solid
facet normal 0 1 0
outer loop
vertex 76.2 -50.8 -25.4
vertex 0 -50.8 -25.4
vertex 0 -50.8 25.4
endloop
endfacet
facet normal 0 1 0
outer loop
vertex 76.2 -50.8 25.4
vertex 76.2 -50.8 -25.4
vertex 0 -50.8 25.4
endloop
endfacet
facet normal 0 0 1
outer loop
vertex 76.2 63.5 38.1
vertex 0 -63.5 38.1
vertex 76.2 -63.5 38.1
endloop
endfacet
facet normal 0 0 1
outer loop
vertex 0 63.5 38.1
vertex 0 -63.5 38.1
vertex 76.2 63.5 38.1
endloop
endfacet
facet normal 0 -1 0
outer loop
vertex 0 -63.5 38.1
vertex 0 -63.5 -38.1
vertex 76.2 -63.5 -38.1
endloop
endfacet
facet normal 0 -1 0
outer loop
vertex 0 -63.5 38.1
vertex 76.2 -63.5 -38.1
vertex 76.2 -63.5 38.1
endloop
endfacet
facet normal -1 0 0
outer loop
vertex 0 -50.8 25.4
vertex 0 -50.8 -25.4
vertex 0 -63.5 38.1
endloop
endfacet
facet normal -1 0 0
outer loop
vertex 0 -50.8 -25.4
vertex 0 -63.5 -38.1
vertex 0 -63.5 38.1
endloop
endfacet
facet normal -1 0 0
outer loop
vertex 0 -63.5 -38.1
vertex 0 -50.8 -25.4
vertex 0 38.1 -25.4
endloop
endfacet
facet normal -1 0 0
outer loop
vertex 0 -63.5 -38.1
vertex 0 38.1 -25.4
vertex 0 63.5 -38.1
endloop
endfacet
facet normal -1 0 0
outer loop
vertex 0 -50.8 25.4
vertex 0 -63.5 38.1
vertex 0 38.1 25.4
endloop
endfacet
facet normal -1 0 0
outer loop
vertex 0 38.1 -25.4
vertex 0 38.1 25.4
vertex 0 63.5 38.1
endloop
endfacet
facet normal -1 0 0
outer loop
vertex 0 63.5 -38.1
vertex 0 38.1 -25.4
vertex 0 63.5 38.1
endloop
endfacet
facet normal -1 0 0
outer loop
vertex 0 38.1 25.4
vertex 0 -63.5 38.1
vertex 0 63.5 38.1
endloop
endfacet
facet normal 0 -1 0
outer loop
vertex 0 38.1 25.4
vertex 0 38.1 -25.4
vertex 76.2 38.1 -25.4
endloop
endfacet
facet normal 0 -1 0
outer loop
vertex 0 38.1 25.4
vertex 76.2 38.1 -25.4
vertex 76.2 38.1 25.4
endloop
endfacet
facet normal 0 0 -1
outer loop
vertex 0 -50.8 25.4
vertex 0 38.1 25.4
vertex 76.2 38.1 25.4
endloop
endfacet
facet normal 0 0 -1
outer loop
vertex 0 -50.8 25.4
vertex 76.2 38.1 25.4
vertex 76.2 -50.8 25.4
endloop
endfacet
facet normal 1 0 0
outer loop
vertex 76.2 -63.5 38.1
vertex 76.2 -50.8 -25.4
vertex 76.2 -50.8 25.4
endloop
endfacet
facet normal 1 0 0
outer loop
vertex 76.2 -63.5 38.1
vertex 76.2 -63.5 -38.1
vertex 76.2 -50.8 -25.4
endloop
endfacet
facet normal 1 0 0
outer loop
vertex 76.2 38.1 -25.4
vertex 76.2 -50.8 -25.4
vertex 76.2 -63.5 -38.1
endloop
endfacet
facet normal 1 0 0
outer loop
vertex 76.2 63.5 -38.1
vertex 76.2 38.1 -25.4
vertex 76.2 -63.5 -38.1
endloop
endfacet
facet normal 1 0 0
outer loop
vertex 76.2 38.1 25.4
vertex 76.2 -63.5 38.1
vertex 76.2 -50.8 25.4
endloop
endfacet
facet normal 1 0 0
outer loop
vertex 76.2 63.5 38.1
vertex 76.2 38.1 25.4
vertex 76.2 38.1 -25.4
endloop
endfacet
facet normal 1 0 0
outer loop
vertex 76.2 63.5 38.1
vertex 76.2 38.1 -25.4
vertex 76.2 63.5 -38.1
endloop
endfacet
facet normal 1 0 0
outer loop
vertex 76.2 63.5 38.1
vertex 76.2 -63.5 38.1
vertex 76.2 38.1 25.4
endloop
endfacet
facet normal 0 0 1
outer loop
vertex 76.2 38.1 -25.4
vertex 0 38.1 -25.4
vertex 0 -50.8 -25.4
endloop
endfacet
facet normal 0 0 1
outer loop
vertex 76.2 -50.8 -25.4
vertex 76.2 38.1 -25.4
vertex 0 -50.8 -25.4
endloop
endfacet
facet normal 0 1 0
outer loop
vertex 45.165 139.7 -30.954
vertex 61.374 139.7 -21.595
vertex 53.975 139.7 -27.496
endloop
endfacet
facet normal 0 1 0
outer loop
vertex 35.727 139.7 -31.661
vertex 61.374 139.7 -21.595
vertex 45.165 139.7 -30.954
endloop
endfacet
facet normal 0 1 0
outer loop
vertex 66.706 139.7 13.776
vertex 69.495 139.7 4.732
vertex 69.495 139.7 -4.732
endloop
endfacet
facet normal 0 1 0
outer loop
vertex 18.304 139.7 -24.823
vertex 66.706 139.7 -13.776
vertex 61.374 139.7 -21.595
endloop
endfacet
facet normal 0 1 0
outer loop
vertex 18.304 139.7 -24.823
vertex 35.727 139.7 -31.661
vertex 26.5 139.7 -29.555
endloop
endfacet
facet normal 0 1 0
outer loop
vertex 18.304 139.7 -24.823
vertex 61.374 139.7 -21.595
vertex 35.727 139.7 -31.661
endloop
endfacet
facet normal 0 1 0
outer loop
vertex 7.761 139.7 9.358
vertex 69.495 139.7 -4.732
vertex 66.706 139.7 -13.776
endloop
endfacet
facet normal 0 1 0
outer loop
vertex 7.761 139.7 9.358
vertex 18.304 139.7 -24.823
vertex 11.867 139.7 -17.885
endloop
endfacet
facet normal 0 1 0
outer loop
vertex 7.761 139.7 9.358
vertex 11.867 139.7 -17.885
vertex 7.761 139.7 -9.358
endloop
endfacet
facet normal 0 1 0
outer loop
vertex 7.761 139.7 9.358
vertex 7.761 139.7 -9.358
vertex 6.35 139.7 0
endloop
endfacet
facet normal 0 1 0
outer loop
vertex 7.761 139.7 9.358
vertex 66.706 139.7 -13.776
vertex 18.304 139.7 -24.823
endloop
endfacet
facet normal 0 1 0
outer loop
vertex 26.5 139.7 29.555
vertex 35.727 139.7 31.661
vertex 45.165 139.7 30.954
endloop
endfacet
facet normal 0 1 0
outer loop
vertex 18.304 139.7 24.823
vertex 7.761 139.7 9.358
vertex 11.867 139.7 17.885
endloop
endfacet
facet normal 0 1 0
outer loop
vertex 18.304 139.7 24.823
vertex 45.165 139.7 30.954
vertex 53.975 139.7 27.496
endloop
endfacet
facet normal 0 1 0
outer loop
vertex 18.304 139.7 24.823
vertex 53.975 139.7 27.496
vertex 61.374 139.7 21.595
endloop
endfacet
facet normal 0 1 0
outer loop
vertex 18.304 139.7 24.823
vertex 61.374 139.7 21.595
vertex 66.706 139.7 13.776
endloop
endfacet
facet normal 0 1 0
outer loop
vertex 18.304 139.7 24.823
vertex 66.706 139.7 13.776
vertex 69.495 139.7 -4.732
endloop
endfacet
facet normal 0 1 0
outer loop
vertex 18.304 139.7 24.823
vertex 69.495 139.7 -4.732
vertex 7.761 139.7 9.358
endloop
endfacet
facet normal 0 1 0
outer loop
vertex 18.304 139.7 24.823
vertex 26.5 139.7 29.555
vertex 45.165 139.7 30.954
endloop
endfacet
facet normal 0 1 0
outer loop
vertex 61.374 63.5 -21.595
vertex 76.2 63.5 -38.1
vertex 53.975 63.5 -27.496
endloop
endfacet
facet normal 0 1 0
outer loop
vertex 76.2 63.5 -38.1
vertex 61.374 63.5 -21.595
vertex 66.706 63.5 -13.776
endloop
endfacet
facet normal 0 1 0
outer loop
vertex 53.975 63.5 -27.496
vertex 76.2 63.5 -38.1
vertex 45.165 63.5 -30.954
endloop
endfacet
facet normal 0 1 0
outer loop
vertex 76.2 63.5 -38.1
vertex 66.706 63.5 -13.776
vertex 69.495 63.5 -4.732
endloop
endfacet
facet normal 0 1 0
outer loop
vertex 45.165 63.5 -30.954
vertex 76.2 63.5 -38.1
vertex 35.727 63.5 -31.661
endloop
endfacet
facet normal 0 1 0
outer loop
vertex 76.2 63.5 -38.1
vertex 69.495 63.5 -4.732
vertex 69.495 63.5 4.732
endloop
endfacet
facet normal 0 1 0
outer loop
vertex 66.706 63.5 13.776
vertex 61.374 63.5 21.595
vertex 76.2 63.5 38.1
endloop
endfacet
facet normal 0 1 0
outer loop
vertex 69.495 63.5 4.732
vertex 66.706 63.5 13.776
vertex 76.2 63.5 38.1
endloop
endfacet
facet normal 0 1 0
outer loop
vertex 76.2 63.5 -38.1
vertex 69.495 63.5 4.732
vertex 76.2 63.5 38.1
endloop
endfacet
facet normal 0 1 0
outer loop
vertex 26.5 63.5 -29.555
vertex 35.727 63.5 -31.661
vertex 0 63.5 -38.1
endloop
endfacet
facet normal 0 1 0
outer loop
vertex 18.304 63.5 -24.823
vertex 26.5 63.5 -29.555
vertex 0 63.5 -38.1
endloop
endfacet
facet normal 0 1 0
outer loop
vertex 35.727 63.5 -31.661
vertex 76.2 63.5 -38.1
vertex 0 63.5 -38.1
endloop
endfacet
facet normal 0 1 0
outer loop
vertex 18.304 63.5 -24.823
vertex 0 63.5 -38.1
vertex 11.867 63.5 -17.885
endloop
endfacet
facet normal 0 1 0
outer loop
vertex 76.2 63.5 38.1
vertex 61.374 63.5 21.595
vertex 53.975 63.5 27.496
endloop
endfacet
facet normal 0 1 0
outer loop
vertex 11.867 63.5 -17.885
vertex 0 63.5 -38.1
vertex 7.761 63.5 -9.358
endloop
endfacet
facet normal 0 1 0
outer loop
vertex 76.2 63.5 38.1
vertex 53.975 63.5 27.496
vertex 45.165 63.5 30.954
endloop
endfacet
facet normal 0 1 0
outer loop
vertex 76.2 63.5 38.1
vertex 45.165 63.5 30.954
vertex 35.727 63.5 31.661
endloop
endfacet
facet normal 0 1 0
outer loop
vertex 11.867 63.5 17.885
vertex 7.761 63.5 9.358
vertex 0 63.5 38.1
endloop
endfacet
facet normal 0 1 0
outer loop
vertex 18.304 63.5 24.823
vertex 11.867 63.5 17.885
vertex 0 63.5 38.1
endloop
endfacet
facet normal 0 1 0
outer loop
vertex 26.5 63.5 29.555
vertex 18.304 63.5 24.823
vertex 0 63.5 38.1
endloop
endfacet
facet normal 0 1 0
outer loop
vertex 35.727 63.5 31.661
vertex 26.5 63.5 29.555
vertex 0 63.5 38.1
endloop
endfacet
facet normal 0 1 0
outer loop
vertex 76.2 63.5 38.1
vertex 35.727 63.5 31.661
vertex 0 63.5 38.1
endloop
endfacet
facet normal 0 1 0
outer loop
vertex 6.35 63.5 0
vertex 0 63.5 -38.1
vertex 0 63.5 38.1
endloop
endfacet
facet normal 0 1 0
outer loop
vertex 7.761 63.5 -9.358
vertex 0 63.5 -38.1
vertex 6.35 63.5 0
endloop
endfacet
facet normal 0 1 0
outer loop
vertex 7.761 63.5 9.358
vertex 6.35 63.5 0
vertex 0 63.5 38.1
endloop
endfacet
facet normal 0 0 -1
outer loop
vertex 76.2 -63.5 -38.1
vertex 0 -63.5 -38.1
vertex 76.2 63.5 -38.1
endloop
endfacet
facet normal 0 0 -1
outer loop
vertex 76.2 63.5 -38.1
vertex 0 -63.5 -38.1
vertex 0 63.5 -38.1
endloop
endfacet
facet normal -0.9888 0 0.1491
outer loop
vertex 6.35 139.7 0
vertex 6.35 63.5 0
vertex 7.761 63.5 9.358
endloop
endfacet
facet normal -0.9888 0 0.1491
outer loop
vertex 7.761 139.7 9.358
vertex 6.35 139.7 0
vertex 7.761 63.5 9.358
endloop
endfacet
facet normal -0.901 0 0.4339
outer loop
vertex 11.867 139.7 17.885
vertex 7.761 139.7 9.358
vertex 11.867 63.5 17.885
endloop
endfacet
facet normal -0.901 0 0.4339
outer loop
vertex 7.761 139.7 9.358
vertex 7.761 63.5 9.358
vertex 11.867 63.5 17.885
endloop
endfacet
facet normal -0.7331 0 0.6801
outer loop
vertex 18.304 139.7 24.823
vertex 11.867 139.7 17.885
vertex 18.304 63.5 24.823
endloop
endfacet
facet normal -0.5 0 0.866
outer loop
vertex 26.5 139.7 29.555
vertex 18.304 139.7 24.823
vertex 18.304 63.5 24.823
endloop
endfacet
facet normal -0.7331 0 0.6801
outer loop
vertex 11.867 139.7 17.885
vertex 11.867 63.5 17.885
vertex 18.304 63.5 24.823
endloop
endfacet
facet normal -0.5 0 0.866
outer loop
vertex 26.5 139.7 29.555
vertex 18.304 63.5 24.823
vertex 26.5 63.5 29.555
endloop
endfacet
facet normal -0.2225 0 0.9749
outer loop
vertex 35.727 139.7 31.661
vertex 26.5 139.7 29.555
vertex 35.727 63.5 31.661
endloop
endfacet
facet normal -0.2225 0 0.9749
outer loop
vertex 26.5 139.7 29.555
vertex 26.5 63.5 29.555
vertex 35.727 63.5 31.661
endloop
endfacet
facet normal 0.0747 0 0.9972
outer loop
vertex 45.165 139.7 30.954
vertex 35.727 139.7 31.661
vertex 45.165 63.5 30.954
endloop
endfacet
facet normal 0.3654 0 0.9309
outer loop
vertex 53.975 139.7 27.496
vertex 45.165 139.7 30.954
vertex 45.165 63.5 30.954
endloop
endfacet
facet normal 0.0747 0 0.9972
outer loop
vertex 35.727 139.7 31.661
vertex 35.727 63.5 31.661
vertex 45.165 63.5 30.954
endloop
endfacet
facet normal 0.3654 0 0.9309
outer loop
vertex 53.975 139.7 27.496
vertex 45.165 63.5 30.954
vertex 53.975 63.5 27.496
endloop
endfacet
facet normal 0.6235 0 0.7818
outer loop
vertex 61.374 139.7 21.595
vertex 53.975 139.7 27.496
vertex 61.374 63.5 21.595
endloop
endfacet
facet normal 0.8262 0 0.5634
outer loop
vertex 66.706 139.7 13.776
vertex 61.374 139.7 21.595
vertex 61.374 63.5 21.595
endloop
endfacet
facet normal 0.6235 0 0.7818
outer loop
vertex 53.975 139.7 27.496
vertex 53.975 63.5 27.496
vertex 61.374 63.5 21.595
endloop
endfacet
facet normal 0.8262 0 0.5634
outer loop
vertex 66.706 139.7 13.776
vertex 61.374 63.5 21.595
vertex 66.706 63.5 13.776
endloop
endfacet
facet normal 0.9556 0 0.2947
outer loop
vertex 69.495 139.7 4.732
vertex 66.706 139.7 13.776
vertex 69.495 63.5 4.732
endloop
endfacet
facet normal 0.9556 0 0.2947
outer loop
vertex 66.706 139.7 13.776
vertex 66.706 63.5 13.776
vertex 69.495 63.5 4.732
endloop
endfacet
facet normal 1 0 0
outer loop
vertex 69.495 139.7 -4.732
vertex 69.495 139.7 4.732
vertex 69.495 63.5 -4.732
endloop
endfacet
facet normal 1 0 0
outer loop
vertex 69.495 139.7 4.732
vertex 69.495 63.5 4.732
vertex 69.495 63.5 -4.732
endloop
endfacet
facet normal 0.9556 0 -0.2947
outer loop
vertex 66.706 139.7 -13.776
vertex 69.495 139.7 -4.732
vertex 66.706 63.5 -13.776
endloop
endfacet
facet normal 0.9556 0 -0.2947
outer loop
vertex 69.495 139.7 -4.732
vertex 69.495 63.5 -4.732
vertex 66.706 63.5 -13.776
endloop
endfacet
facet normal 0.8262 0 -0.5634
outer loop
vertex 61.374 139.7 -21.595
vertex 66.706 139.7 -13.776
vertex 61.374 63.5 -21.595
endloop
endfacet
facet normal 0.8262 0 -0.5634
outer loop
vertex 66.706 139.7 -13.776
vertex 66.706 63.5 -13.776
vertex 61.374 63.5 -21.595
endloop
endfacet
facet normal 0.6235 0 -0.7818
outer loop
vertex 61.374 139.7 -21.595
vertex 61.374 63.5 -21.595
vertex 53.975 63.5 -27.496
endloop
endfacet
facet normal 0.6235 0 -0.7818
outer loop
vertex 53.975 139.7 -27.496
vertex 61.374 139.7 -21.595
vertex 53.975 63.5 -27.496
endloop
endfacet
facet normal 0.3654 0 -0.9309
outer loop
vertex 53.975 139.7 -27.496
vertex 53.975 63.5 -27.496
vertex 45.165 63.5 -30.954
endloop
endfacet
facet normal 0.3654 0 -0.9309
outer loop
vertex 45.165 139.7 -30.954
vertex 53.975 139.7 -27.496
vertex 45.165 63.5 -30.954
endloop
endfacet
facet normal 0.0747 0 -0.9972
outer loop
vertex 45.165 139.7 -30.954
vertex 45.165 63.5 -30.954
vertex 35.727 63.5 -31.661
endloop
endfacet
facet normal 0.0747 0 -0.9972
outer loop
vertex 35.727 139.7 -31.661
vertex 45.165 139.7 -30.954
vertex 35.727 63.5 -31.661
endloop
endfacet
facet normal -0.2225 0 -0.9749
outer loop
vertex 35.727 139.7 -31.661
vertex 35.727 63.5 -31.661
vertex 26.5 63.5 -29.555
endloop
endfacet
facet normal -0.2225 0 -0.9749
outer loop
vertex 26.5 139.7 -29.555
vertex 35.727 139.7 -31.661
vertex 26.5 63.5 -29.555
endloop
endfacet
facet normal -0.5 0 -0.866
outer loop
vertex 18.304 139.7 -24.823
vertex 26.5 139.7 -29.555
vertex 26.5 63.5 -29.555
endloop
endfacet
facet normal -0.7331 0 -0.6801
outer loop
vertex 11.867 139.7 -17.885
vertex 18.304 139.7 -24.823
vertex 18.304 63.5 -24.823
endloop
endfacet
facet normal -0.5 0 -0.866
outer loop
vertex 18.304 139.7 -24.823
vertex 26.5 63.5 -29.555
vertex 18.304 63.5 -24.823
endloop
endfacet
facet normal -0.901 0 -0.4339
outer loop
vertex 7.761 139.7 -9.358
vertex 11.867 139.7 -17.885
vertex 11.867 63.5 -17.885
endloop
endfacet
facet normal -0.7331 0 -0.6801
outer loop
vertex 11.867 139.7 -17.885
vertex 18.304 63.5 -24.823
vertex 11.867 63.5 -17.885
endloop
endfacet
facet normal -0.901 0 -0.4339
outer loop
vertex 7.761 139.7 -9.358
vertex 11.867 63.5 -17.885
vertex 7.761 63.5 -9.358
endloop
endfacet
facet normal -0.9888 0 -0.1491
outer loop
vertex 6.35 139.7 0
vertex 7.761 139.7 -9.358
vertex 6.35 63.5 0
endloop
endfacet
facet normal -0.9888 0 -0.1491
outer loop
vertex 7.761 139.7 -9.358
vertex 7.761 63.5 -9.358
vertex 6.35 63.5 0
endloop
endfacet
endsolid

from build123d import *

# Parameters (mm, degrees)
F0_W     = 127
F0_H     = 76.2
F1_DEPTH = 76.2
F2_R     = 31.75
F3_DEPTH = 76.2
F4_W     = 88.9
F4_H     = 50.8
F5_DEPTH = 76.201


with BuildPart() as f1:
    # F0 (on Right) → F1 (new body)
    with BuildSketch(Plane.YZ):
        Rectangle(F0_W, F0_H)
    extrude(amount=F1_DEPTH)

    # F2 (on face) → F3 (join)
    with BuildSketch(Plane(origin=(0, 63.5, 0), x_dir=(-1, 0, 0), z_dir=(0, 1, 0))):
        with Locations((-38.1, 0)):
            Circle(F2_R)
    extrude(amount=F3_DEPTH)

    # F4 (on face) → F5 (cut, through all)
    with BuildSketch(Plane(origin=(0, 0, 0), x_dir=(0, -1, 0), z_dir=(-1, 0, 0))):
        with Locations((6.35, 0)):
            Rectangle(F4_W, F4_H)
    extrude(amount=-F5_DEPTH, mode=Mode.SUBTRACT)


solid = f1.part
